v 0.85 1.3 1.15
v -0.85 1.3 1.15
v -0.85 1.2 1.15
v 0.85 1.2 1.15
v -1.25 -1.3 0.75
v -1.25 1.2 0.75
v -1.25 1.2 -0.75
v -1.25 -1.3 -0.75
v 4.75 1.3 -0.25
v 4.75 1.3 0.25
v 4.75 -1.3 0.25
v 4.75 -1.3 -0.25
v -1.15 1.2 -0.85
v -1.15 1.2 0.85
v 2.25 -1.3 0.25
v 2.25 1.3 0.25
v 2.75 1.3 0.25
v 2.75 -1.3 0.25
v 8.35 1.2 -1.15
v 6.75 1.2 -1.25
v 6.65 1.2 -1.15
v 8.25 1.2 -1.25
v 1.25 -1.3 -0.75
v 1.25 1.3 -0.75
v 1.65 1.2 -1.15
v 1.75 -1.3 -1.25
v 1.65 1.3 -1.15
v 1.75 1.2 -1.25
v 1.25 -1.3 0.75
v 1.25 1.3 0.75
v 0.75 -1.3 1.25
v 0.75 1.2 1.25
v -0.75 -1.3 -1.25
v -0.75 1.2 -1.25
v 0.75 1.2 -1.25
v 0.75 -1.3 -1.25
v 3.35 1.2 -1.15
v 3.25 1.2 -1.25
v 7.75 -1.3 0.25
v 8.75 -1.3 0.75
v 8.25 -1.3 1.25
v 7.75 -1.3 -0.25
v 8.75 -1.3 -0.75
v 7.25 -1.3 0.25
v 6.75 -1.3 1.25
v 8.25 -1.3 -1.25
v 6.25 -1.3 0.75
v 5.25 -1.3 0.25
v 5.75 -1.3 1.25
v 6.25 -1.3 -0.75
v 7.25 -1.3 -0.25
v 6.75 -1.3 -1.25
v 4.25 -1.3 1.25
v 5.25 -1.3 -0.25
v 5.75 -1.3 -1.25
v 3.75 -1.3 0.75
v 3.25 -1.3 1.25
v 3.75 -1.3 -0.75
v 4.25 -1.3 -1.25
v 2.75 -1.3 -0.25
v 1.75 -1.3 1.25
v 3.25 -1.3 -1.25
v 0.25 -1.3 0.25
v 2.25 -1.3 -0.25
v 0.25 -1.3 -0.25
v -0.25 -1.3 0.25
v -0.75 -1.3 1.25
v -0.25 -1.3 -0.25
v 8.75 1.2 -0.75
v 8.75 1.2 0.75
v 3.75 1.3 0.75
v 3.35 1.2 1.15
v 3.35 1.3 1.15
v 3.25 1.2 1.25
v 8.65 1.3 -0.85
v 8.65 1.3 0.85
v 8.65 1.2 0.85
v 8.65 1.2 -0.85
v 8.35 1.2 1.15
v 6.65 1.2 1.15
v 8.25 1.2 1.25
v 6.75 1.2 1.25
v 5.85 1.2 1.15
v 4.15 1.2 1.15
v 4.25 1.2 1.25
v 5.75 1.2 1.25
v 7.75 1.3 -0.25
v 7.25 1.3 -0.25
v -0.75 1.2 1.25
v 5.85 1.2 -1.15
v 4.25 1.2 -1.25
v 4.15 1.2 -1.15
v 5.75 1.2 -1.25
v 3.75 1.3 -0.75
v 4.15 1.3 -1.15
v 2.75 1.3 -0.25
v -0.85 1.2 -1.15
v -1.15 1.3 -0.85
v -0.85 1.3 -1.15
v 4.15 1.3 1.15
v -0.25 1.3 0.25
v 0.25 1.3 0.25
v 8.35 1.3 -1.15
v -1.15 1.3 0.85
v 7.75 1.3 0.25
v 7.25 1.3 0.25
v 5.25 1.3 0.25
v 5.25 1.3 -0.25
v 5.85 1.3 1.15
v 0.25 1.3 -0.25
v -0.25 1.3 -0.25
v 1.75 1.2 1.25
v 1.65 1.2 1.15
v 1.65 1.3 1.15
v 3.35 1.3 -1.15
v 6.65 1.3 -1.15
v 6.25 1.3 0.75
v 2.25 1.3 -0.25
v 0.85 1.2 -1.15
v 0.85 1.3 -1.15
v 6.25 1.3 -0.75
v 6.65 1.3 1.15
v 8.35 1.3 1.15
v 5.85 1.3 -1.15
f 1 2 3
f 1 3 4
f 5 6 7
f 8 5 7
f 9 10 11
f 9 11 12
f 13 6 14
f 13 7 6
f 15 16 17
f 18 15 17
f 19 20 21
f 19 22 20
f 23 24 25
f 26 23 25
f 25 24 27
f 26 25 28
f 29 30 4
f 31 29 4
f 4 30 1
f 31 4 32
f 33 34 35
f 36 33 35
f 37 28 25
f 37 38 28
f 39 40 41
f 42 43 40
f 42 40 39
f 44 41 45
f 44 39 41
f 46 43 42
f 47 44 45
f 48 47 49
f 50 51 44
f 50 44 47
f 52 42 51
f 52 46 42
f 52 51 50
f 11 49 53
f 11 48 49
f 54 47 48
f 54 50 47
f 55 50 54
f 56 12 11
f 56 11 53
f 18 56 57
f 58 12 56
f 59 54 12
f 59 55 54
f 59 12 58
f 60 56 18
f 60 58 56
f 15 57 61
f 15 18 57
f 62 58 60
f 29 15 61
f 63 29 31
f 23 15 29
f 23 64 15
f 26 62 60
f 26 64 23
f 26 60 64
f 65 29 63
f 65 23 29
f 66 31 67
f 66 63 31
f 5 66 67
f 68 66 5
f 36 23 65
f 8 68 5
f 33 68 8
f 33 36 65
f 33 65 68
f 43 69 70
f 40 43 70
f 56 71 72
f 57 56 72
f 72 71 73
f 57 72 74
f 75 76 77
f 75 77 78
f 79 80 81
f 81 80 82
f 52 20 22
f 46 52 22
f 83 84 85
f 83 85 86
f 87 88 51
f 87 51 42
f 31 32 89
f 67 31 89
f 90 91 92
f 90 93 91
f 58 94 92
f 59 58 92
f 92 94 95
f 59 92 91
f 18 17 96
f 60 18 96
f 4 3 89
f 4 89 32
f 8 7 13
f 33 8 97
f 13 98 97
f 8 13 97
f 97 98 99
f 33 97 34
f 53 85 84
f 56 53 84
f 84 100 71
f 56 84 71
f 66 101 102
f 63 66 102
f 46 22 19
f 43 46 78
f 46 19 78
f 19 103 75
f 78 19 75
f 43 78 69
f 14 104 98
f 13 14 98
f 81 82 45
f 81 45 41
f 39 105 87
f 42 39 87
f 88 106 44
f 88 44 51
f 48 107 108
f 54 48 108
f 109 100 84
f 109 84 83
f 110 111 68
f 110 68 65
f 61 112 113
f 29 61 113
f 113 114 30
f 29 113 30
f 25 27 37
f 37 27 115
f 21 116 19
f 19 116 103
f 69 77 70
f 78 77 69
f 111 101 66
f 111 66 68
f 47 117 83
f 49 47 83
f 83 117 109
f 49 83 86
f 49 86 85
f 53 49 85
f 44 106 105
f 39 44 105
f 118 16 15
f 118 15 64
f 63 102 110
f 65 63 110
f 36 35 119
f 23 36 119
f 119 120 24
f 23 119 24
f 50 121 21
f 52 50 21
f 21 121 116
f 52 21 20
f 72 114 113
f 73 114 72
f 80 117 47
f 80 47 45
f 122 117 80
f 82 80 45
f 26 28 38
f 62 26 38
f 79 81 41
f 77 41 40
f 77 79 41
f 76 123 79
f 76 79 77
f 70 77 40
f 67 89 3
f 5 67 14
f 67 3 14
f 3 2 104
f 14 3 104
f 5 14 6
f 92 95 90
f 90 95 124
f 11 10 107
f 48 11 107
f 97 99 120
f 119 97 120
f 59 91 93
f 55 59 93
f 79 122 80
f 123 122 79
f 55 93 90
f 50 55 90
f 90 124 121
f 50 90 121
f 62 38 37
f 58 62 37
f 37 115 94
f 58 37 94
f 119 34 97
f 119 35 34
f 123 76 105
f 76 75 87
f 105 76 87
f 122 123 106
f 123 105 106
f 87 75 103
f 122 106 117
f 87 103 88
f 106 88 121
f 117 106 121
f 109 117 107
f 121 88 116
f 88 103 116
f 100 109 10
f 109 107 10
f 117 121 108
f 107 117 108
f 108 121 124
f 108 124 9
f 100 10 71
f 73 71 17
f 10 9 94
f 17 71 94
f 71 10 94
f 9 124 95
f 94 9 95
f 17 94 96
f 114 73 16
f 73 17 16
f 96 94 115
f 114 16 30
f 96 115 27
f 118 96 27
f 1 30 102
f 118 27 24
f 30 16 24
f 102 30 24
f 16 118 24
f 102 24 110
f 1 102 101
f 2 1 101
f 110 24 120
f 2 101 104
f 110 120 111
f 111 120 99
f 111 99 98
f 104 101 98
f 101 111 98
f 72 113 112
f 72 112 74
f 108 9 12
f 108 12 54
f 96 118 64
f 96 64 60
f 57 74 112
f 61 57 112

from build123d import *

# Parameters (mm, degrees)
BOSS_EXTRUDE1_DEPTH = 1.3
SKETCH2_W           = 11.59712349
SKETCH2_H           = 4.16940885
SKETCH2_W_2         = 9.8
SKETCH2_H_2         = 2.3
CUT_EXTRUDE1_DEPTH  = 0.1
SKETCH3_W           = 0.5
SKETCH3_H           = 0.5
CUT_EXTRUDE2_DEPTH  = 3.6


with BuildPart() as part:
    # Sketch1 → Boss-Extrude1 (new body, symmetric)
    with BuildSketch(Plane(origin=(0, 0, 0), x_dir=(1, 0, 0), z_dir=(0, 1, 0))):
        Polygon((3.75, -0.75), (6.25, -0.75), (5.75, -1.25), (4.25, -1.25), align=None)
        Polygon((8.25, -1.25), (8.75, -0.75), (6.25, -0.75), (6.75, -1.25), align=None)
        Polygon((8.75, -0.75), (6.25, -0.75), (3.75, -0.75), (3.25, -1.25), (1.75, -1.25), (1.25, -0.75), (-1.25, -0.75), (-1.25, 0.75), (-0.75, 1.25), (0.75, 1.25), (1.25, 0.75), (1.75, 1.25), (3.25, 1.25), (3.75, 0.75), (4.25, 1.25), (5.75, 1.25), (6.25, 0.75), (6.75, 1.25), (8.25, 1.25), (8.75, 0.75), align=None)
        Polygon((-1.25, -0.75), (1.25, -0.75), (0.75, -1.25), (-0.75, -1.25), align=None)
    extrude(amount=BOSS_EXTRUDE1_DEPTH, both=True)

    # Sketch2 → Cut-Extrude1 (cut)
    with BuildSketch(Plane(origin=(0, 1.3, 0), x_dir=(1, 0, 0), z_dir=(0, 1, 0))):
        with Locations((3.75, 0)):
            Rectangle(SKETCH2_W, SKETCH2_H)
        with Locations((3.75, 0)):
            Rectangle(SKETCH2_W_2, SKETCH2_H_2, mode=Mode.SUBTRACT)
    extrude(amount=-CUT_EXTRUDE1_DEPTH, mode=Mode.SUBTRACT)

    # Sketch3 → Cut-Extrude2 (cut, through all)
    with BuildSketch(Plane(origin=(0, 1.3, 0), x_dir=(1, 0, 0), z_dir=(0, 1, 0))):
        with Locations((2.5, 0)):
            Rectangle(SKETCH3_W, SKETCH3_H)
        Rectangle(SKETCH3_W, SKETCH3_H)
        with Locations((5, 0)):
            Rectangle(SKETCH3_W, SKETCH3_H)
        with Locations((7.5, 0)):
            Rectangle(SKETCH3_W, SKETCH3_H)
    extrude(amount=-CUT_EXTRUDE2_DEPTH, mode=Mode.SUBTRACT)


solid = part.part
